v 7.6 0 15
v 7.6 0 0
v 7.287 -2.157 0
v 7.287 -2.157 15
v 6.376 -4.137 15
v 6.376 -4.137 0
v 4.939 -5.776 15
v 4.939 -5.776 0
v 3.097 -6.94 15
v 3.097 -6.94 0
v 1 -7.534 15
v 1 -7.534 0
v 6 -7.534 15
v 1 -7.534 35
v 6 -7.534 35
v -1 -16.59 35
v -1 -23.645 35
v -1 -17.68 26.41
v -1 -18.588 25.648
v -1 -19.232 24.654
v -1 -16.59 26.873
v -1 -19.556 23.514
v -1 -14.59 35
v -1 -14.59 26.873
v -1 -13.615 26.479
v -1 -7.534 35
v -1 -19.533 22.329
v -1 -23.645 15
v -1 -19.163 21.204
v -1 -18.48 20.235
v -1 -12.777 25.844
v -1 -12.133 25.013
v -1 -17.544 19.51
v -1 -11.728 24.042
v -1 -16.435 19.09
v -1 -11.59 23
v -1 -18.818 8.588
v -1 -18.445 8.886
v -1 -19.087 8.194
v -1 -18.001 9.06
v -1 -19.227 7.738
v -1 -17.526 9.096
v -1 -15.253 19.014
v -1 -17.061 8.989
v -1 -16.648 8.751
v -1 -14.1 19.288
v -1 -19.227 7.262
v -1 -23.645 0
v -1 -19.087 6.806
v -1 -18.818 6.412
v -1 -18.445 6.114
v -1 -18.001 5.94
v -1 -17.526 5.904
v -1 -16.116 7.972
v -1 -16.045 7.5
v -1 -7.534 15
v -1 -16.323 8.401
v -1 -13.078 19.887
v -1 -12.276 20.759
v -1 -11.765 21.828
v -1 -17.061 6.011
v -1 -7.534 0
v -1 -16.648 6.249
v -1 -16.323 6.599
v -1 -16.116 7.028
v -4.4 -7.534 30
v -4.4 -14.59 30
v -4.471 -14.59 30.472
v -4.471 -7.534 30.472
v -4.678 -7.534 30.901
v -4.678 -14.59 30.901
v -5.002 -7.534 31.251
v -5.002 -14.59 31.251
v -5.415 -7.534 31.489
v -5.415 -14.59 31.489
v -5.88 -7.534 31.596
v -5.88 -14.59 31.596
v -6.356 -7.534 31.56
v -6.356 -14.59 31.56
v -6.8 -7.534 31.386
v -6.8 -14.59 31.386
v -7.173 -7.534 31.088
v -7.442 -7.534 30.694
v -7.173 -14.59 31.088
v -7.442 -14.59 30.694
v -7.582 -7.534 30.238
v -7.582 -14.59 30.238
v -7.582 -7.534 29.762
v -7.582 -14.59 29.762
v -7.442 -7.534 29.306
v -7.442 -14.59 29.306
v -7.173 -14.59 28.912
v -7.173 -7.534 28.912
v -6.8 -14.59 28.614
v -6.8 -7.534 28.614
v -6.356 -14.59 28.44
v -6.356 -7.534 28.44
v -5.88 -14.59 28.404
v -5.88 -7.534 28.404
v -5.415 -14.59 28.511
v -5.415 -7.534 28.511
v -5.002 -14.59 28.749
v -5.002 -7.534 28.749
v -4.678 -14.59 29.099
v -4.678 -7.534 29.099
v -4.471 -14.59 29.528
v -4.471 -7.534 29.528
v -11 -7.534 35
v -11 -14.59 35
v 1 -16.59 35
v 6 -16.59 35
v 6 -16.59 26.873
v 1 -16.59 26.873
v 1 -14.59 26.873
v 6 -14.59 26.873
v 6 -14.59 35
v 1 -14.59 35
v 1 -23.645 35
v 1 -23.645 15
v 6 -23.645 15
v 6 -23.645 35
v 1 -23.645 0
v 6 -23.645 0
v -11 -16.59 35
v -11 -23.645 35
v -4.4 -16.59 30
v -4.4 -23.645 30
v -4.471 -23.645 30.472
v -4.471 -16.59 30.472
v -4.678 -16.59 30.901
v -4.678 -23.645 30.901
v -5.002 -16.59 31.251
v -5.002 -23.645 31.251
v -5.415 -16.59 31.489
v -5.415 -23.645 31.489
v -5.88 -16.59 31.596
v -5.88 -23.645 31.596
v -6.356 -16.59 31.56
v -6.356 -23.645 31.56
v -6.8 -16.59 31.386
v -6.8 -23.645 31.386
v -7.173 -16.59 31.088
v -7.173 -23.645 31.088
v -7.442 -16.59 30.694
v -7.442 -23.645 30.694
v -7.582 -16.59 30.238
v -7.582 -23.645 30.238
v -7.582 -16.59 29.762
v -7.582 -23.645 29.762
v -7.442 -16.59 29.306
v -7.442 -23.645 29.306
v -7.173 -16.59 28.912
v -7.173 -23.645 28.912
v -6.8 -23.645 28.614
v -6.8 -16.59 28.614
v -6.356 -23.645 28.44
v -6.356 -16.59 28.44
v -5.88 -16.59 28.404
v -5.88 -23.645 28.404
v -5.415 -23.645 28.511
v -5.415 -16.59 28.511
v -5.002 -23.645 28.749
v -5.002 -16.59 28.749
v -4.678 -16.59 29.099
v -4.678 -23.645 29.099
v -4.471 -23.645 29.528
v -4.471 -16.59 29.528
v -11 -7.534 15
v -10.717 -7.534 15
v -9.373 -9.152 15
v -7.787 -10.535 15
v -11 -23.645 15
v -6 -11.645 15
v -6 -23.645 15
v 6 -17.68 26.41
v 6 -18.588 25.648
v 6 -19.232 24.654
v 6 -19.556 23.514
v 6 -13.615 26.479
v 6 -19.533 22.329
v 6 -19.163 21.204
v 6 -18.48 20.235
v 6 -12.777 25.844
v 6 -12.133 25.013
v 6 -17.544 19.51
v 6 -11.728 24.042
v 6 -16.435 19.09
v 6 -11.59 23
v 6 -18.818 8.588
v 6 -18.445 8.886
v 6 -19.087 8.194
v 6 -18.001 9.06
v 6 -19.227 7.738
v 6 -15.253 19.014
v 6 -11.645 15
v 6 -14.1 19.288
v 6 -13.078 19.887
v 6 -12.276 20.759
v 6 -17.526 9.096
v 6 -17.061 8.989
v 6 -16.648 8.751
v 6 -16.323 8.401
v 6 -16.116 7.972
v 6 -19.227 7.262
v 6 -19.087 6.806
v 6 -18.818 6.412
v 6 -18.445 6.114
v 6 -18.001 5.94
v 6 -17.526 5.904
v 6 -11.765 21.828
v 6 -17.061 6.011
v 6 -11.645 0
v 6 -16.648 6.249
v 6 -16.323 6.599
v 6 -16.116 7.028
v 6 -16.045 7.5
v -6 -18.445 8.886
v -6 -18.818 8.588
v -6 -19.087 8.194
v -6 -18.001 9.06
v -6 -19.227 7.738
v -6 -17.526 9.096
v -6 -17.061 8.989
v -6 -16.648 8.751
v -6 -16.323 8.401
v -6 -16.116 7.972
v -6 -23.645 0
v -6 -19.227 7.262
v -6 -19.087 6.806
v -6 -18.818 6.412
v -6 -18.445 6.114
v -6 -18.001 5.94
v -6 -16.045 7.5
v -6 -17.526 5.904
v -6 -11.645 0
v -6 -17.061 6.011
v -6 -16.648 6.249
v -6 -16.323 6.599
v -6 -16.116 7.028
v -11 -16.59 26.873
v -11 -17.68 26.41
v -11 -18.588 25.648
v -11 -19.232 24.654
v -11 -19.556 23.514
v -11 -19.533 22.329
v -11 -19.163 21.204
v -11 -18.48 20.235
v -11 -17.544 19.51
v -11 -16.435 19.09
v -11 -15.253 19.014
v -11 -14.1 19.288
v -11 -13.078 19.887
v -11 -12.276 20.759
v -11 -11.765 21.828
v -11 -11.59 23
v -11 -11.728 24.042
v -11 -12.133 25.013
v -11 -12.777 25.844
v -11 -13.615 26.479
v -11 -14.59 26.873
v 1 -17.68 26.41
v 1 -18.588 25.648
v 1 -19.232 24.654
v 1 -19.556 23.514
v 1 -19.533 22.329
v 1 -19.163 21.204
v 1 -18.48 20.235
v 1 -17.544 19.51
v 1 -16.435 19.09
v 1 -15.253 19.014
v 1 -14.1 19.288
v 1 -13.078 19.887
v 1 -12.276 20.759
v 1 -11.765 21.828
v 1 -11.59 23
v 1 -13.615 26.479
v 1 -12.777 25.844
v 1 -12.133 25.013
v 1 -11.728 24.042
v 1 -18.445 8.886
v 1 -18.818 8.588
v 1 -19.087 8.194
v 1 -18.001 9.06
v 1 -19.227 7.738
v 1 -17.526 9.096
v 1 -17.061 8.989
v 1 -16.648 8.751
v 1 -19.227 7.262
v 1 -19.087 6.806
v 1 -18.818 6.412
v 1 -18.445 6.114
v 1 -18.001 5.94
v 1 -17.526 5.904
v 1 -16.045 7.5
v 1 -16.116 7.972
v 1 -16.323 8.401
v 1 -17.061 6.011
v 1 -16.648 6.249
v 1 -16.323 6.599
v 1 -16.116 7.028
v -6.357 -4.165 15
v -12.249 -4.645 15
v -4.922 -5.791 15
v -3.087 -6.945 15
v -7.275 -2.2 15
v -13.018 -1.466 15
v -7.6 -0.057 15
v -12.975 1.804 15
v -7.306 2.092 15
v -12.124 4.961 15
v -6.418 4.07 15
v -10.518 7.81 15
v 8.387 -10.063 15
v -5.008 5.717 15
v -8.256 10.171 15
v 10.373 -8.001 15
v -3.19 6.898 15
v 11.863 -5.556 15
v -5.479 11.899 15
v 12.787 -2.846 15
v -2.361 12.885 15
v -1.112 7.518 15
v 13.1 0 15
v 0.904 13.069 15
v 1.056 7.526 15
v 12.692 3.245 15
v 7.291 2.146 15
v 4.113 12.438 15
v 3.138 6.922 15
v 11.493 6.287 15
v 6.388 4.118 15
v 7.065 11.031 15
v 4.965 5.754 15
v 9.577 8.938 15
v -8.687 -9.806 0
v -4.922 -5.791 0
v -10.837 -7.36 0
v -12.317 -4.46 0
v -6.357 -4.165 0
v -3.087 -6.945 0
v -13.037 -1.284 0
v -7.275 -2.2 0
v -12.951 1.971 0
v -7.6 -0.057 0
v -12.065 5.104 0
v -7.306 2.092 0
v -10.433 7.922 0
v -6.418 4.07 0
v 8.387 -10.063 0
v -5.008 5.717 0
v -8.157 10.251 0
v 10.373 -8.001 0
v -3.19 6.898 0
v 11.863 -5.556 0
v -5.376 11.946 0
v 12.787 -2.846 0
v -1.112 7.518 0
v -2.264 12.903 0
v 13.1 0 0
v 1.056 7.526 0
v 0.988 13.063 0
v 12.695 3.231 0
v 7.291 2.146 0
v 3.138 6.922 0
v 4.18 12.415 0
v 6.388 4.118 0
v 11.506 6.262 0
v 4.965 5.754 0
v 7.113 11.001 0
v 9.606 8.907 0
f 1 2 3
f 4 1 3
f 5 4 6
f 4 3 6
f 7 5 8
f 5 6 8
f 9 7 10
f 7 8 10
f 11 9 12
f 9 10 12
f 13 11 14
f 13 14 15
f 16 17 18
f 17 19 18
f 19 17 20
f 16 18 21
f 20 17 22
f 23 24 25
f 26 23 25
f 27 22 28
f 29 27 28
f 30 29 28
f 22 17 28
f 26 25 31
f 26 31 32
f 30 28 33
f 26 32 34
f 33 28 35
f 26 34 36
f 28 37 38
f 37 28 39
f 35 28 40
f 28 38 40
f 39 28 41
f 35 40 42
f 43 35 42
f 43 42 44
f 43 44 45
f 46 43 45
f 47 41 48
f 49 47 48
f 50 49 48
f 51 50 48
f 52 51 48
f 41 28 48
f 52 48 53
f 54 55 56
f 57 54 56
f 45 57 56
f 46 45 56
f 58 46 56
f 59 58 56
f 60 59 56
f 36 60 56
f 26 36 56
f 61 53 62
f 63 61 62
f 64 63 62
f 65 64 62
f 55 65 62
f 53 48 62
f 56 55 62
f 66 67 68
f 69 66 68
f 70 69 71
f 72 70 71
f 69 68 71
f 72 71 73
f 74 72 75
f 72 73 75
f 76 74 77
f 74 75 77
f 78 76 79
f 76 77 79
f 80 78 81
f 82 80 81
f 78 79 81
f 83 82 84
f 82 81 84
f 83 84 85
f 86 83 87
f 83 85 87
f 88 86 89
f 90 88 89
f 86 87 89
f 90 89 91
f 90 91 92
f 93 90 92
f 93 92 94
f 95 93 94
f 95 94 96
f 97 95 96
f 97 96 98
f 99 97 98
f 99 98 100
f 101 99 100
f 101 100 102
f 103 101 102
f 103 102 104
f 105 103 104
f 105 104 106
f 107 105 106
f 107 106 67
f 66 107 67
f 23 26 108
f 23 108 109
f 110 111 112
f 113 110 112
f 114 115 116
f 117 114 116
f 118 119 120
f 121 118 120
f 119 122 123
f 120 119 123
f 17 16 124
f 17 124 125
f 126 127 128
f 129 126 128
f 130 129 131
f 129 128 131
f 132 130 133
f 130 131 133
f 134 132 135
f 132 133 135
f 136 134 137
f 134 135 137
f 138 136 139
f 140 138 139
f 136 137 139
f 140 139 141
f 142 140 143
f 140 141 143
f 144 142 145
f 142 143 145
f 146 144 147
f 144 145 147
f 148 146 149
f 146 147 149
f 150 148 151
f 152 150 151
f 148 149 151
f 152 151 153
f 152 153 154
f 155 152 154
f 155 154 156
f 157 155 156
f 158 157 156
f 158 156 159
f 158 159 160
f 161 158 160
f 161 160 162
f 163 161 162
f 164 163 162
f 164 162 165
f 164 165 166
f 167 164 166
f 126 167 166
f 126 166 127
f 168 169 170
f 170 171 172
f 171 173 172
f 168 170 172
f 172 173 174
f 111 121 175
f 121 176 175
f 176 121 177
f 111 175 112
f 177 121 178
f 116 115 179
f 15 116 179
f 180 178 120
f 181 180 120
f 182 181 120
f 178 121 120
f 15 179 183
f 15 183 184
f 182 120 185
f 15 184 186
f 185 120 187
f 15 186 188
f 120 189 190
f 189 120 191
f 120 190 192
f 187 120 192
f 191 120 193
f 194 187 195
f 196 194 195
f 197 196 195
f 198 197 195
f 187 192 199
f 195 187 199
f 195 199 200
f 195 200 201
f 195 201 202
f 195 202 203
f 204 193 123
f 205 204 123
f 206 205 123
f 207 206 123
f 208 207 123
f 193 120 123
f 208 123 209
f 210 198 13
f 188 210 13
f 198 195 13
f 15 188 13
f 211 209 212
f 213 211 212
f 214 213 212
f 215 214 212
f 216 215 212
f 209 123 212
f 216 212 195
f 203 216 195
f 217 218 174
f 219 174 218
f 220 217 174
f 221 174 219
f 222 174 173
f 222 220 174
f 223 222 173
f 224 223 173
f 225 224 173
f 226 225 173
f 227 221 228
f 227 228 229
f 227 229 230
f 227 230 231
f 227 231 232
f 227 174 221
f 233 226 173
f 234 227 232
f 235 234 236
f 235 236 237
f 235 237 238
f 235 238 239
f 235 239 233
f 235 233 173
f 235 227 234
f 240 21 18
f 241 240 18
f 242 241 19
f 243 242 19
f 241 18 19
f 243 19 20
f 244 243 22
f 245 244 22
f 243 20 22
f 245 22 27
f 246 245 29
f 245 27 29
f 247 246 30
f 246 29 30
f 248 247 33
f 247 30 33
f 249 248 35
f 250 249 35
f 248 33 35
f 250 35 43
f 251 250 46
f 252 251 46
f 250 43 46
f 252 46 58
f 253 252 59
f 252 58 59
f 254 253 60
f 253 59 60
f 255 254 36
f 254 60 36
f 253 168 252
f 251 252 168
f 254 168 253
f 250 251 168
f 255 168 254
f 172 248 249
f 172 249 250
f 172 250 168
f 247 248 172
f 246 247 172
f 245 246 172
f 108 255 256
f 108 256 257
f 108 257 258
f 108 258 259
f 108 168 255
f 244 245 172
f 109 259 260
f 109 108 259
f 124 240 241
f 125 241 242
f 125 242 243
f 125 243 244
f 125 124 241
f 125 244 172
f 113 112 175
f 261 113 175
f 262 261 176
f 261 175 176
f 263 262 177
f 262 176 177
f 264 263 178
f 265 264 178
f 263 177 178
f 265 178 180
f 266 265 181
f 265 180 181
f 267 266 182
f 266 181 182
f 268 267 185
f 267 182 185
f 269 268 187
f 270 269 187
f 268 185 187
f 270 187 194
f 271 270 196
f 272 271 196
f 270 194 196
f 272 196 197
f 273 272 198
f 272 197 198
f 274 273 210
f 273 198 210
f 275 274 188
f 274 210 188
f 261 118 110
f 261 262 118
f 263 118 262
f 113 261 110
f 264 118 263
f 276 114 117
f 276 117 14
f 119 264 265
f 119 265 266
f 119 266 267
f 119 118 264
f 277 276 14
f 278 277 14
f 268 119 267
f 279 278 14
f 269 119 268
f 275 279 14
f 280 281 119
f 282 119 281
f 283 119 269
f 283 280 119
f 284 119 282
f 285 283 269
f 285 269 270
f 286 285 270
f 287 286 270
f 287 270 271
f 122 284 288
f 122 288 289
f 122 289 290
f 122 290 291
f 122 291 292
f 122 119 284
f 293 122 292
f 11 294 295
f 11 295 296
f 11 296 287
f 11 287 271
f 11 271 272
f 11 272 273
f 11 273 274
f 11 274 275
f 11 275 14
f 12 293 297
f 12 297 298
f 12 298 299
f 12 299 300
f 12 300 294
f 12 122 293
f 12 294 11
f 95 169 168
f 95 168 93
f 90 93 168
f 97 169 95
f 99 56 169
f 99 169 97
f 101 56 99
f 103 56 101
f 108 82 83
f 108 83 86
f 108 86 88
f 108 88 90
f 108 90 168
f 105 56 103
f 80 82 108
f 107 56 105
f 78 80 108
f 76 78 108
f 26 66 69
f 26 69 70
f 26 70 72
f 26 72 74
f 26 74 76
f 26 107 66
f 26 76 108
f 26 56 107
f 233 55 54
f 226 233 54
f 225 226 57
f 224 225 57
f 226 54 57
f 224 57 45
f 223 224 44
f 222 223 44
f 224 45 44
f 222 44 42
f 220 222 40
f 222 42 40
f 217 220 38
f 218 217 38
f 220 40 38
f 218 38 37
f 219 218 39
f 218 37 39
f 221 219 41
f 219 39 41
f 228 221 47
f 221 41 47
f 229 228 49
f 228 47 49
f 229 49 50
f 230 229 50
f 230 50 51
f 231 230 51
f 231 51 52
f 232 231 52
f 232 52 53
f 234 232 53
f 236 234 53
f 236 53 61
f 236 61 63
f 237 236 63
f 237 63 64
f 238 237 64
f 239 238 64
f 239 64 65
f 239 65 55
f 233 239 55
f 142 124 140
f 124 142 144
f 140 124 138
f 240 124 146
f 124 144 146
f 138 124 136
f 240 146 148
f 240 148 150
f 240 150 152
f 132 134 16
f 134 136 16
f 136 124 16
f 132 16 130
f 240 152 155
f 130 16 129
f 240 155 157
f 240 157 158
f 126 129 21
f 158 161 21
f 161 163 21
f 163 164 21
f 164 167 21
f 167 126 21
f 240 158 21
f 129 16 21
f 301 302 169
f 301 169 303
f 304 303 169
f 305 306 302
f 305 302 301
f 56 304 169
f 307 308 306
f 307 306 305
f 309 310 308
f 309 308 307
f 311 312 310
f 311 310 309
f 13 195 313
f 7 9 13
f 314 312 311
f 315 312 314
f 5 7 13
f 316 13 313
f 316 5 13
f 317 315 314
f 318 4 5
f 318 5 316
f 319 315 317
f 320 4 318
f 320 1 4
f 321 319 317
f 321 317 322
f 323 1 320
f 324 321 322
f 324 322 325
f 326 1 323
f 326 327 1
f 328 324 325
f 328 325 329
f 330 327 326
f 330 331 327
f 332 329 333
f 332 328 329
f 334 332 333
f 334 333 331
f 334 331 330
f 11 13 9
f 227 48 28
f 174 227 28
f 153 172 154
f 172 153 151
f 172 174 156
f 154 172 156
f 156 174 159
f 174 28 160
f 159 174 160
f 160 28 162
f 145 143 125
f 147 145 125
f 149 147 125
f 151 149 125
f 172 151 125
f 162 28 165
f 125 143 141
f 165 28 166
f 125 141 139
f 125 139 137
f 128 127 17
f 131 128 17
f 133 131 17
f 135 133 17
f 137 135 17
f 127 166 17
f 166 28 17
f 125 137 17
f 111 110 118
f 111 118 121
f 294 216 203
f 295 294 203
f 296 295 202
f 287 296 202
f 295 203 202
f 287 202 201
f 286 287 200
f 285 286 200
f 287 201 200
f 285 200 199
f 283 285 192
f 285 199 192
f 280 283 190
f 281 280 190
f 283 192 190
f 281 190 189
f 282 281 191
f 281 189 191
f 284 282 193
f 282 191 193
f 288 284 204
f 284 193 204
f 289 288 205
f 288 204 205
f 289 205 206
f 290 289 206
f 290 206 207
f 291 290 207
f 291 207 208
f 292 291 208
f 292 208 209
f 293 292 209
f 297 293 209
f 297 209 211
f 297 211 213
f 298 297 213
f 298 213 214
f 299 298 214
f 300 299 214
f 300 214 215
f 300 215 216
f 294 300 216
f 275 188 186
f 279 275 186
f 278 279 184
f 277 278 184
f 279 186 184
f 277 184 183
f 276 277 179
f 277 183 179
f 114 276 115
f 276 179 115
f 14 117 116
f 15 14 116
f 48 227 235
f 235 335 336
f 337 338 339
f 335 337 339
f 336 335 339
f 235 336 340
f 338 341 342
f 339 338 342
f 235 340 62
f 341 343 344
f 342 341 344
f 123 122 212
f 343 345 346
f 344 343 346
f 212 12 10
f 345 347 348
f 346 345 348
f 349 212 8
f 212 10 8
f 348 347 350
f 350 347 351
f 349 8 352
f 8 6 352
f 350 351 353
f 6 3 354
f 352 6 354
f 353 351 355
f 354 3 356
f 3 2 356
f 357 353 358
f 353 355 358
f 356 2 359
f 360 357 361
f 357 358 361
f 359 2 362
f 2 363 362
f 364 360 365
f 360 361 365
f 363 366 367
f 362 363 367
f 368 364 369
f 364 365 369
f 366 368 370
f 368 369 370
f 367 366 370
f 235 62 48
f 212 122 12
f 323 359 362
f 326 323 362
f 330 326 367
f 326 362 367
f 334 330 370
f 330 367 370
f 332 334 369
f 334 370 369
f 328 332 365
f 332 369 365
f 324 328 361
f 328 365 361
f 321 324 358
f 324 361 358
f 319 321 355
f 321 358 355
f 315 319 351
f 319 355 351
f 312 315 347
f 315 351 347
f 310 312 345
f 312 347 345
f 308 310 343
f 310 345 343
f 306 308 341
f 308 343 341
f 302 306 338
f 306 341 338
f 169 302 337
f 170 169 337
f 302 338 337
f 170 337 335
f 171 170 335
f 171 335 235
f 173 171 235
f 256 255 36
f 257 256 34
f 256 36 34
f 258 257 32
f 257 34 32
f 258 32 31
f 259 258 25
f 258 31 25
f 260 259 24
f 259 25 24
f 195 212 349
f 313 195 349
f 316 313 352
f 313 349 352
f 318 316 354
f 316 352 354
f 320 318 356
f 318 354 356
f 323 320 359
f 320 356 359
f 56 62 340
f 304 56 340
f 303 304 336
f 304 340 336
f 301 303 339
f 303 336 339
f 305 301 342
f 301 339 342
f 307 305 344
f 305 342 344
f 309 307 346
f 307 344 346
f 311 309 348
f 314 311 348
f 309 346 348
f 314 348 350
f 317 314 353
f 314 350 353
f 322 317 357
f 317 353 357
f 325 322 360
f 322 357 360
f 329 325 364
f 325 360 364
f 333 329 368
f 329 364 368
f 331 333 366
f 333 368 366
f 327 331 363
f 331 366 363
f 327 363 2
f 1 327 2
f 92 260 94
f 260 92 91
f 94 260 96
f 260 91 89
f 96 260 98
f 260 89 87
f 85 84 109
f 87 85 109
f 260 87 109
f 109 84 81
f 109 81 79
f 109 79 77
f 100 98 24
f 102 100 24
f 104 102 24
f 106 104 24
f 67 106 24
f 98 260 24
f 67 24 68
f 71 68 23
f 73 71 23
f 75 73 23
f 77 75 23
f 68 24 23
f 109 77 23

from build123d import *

# Parameters (mm, degrees)
F1_DEPTH  = 15
F2_R      = 1.6
F3_DEPTH  = 20
F4_W      = 5
F4_H      = 16.1112473921
F5_DEPTH  = 20
F6_W      = 16.1112473921
F6_H      = 20
F7_DEPTH  = 5
F9_DEPTH  = 20
F10_R     = 1.6
F11_DEPTH = 20


with BuildPart() as f1:
    # F0 (on Top) → F1 (new body)
    with BuildSketch(Plane.XY):
        with BuildLine():
            Line((-1, -23.6451706729), (-1, -13.0617762957))
            ThreePointArc((-1, -13.0617762957), (-3.570951256, -12.6039004728), (-6, -11.6451706729))
            Line((-6, -11.6451706729), (-6, -23.6451706729))
            Line((-6, -23.6451706729), (-1, -23.6451706729))
        make_face()
        with BuildLine():
            ThreePointArc((6, -11.6451706729), (3.570951256, -12.6039004728), (1, -13.0617762957))
            Line((1, -13.0617762957), (1, -23.6451706729))
            Line((1, -23.6451706729), (6, -23.6451706729))
            Line((6, -23.6451706729), (6, -11.6451706729))
        make_face()
        with BuildLine():
            ThreePointArc((-1, -7.5339232807), (-5.0079936102, 5.7166423712), (7.6, 0))
            ThreePointArc((7.6, 0), (5.7166423712, -5.0079936102), (1, -7.5339232807))
            Line((1, -7.5339232807), (1, -13.0617762957))
            ThreePointArc((1, -13.0617762957), (3.570951256, -12.6039004728), (6, -11.6451706729))
            ThreePointArc((6, -11.6451706729), (11.1850346446, -6.8194574564), (13.1, 0))
            ThreePointArc((13.1, 0), (-6.8194574564, 11.1850346446), (-6, -11.6451706729))
            ThreePointArc((-6, -11.6451706729), (-3.570951256, -12.6039004728), (-1, -13.0617762957))
            Line((-1, -13.0617762957), (-1, -7.5339232807))
        make_face()
    extrude(amount=F1_DEPTH)

    # F2 (on face) → F3 (cut)
    with BuildSketch(Plane.YZ.offset(6)):
        with Locations((-17.6451706729, 7.5)):
            Circle(F2_R)
    extrude(amount=-F3_DEPTH, mode=Mode.SUBTRACT)

    # F4 (on face) → F5 (join)
    with BuildSketch(Plane.XY.offset(15)):
        with Locations((3.5, -15.5895469768)):
            Rectangle(F4_W, F4_H)
        with Locations((-3.5, -15.5895469768)):
            Rectangle(F4_W, F4_H)
    extrude(amount=F5_DEPTH)

    # F6 (on face) → F7 (join)
    with BuildSketch(Plane(origin=(-6, 0, 0), x_dir=(0, -1, 0), z_dir=(-1, 0, 0))):
        with Locations((15.5895469768, 25)):
            Rectangle(F6_W, F6_H)
    extrude(amount=F7_DEPTH)

    # F8 (on face) → F9 (cut)
    with BuildSketch(Plane.YZ.offset(6)):
        with BuildLine():
            ThreePointArc((-16.5895469768, 26.8729833462), (-18.0390367196, 19.8377223398), (-11.5895469768, 23))
            ThreePointArc((-11.5895469768, 23), (-12.4272693166, 25.4494897428), (-14.5895469768, 26.8729833462))
            Line((-14.5895469768, 26.8729833462), (-16.5895469768, 26.8729833462))
        make_face()
        with BuildLine():
            Line((-16.5895469768, 26.8729833462), (-14.5895469768, 26.8729833462))
            ThreePointArc((-14.5895469768, 26.8729833462), (-15.5895469768, 27), (-16.5895469768, 26.8729833462))
        make_face()
        with BuildLine():
            ThreePointArc((-16.5895469768, 26.8729833462), (-15.5895469768, 27), (-14.5895469768, 26.8729833462))
            Line((-14.5895469768, 26.8729833462), (-14.5895469768, 35))
            Line((-14.5895469768, 35), (-16.5895469768, 35))
            Line((-16.5895469768, 35), (-16.5895469768, 26.8729833462))
        make_face()
    extrude(amount=-F9_DEPTH, mode=Mode.SUBTRACT)

    # F10 (on face) → F11 (cut)
    with BuildSketch(Plane.XZ.offset(23.6451706729)):
        with Locations((-6, 30)):
            Circle(F10_R)
    extrude(amount=-F11_DEPTH, mode=Mode.SUBTRACT)


solid = f1.part
